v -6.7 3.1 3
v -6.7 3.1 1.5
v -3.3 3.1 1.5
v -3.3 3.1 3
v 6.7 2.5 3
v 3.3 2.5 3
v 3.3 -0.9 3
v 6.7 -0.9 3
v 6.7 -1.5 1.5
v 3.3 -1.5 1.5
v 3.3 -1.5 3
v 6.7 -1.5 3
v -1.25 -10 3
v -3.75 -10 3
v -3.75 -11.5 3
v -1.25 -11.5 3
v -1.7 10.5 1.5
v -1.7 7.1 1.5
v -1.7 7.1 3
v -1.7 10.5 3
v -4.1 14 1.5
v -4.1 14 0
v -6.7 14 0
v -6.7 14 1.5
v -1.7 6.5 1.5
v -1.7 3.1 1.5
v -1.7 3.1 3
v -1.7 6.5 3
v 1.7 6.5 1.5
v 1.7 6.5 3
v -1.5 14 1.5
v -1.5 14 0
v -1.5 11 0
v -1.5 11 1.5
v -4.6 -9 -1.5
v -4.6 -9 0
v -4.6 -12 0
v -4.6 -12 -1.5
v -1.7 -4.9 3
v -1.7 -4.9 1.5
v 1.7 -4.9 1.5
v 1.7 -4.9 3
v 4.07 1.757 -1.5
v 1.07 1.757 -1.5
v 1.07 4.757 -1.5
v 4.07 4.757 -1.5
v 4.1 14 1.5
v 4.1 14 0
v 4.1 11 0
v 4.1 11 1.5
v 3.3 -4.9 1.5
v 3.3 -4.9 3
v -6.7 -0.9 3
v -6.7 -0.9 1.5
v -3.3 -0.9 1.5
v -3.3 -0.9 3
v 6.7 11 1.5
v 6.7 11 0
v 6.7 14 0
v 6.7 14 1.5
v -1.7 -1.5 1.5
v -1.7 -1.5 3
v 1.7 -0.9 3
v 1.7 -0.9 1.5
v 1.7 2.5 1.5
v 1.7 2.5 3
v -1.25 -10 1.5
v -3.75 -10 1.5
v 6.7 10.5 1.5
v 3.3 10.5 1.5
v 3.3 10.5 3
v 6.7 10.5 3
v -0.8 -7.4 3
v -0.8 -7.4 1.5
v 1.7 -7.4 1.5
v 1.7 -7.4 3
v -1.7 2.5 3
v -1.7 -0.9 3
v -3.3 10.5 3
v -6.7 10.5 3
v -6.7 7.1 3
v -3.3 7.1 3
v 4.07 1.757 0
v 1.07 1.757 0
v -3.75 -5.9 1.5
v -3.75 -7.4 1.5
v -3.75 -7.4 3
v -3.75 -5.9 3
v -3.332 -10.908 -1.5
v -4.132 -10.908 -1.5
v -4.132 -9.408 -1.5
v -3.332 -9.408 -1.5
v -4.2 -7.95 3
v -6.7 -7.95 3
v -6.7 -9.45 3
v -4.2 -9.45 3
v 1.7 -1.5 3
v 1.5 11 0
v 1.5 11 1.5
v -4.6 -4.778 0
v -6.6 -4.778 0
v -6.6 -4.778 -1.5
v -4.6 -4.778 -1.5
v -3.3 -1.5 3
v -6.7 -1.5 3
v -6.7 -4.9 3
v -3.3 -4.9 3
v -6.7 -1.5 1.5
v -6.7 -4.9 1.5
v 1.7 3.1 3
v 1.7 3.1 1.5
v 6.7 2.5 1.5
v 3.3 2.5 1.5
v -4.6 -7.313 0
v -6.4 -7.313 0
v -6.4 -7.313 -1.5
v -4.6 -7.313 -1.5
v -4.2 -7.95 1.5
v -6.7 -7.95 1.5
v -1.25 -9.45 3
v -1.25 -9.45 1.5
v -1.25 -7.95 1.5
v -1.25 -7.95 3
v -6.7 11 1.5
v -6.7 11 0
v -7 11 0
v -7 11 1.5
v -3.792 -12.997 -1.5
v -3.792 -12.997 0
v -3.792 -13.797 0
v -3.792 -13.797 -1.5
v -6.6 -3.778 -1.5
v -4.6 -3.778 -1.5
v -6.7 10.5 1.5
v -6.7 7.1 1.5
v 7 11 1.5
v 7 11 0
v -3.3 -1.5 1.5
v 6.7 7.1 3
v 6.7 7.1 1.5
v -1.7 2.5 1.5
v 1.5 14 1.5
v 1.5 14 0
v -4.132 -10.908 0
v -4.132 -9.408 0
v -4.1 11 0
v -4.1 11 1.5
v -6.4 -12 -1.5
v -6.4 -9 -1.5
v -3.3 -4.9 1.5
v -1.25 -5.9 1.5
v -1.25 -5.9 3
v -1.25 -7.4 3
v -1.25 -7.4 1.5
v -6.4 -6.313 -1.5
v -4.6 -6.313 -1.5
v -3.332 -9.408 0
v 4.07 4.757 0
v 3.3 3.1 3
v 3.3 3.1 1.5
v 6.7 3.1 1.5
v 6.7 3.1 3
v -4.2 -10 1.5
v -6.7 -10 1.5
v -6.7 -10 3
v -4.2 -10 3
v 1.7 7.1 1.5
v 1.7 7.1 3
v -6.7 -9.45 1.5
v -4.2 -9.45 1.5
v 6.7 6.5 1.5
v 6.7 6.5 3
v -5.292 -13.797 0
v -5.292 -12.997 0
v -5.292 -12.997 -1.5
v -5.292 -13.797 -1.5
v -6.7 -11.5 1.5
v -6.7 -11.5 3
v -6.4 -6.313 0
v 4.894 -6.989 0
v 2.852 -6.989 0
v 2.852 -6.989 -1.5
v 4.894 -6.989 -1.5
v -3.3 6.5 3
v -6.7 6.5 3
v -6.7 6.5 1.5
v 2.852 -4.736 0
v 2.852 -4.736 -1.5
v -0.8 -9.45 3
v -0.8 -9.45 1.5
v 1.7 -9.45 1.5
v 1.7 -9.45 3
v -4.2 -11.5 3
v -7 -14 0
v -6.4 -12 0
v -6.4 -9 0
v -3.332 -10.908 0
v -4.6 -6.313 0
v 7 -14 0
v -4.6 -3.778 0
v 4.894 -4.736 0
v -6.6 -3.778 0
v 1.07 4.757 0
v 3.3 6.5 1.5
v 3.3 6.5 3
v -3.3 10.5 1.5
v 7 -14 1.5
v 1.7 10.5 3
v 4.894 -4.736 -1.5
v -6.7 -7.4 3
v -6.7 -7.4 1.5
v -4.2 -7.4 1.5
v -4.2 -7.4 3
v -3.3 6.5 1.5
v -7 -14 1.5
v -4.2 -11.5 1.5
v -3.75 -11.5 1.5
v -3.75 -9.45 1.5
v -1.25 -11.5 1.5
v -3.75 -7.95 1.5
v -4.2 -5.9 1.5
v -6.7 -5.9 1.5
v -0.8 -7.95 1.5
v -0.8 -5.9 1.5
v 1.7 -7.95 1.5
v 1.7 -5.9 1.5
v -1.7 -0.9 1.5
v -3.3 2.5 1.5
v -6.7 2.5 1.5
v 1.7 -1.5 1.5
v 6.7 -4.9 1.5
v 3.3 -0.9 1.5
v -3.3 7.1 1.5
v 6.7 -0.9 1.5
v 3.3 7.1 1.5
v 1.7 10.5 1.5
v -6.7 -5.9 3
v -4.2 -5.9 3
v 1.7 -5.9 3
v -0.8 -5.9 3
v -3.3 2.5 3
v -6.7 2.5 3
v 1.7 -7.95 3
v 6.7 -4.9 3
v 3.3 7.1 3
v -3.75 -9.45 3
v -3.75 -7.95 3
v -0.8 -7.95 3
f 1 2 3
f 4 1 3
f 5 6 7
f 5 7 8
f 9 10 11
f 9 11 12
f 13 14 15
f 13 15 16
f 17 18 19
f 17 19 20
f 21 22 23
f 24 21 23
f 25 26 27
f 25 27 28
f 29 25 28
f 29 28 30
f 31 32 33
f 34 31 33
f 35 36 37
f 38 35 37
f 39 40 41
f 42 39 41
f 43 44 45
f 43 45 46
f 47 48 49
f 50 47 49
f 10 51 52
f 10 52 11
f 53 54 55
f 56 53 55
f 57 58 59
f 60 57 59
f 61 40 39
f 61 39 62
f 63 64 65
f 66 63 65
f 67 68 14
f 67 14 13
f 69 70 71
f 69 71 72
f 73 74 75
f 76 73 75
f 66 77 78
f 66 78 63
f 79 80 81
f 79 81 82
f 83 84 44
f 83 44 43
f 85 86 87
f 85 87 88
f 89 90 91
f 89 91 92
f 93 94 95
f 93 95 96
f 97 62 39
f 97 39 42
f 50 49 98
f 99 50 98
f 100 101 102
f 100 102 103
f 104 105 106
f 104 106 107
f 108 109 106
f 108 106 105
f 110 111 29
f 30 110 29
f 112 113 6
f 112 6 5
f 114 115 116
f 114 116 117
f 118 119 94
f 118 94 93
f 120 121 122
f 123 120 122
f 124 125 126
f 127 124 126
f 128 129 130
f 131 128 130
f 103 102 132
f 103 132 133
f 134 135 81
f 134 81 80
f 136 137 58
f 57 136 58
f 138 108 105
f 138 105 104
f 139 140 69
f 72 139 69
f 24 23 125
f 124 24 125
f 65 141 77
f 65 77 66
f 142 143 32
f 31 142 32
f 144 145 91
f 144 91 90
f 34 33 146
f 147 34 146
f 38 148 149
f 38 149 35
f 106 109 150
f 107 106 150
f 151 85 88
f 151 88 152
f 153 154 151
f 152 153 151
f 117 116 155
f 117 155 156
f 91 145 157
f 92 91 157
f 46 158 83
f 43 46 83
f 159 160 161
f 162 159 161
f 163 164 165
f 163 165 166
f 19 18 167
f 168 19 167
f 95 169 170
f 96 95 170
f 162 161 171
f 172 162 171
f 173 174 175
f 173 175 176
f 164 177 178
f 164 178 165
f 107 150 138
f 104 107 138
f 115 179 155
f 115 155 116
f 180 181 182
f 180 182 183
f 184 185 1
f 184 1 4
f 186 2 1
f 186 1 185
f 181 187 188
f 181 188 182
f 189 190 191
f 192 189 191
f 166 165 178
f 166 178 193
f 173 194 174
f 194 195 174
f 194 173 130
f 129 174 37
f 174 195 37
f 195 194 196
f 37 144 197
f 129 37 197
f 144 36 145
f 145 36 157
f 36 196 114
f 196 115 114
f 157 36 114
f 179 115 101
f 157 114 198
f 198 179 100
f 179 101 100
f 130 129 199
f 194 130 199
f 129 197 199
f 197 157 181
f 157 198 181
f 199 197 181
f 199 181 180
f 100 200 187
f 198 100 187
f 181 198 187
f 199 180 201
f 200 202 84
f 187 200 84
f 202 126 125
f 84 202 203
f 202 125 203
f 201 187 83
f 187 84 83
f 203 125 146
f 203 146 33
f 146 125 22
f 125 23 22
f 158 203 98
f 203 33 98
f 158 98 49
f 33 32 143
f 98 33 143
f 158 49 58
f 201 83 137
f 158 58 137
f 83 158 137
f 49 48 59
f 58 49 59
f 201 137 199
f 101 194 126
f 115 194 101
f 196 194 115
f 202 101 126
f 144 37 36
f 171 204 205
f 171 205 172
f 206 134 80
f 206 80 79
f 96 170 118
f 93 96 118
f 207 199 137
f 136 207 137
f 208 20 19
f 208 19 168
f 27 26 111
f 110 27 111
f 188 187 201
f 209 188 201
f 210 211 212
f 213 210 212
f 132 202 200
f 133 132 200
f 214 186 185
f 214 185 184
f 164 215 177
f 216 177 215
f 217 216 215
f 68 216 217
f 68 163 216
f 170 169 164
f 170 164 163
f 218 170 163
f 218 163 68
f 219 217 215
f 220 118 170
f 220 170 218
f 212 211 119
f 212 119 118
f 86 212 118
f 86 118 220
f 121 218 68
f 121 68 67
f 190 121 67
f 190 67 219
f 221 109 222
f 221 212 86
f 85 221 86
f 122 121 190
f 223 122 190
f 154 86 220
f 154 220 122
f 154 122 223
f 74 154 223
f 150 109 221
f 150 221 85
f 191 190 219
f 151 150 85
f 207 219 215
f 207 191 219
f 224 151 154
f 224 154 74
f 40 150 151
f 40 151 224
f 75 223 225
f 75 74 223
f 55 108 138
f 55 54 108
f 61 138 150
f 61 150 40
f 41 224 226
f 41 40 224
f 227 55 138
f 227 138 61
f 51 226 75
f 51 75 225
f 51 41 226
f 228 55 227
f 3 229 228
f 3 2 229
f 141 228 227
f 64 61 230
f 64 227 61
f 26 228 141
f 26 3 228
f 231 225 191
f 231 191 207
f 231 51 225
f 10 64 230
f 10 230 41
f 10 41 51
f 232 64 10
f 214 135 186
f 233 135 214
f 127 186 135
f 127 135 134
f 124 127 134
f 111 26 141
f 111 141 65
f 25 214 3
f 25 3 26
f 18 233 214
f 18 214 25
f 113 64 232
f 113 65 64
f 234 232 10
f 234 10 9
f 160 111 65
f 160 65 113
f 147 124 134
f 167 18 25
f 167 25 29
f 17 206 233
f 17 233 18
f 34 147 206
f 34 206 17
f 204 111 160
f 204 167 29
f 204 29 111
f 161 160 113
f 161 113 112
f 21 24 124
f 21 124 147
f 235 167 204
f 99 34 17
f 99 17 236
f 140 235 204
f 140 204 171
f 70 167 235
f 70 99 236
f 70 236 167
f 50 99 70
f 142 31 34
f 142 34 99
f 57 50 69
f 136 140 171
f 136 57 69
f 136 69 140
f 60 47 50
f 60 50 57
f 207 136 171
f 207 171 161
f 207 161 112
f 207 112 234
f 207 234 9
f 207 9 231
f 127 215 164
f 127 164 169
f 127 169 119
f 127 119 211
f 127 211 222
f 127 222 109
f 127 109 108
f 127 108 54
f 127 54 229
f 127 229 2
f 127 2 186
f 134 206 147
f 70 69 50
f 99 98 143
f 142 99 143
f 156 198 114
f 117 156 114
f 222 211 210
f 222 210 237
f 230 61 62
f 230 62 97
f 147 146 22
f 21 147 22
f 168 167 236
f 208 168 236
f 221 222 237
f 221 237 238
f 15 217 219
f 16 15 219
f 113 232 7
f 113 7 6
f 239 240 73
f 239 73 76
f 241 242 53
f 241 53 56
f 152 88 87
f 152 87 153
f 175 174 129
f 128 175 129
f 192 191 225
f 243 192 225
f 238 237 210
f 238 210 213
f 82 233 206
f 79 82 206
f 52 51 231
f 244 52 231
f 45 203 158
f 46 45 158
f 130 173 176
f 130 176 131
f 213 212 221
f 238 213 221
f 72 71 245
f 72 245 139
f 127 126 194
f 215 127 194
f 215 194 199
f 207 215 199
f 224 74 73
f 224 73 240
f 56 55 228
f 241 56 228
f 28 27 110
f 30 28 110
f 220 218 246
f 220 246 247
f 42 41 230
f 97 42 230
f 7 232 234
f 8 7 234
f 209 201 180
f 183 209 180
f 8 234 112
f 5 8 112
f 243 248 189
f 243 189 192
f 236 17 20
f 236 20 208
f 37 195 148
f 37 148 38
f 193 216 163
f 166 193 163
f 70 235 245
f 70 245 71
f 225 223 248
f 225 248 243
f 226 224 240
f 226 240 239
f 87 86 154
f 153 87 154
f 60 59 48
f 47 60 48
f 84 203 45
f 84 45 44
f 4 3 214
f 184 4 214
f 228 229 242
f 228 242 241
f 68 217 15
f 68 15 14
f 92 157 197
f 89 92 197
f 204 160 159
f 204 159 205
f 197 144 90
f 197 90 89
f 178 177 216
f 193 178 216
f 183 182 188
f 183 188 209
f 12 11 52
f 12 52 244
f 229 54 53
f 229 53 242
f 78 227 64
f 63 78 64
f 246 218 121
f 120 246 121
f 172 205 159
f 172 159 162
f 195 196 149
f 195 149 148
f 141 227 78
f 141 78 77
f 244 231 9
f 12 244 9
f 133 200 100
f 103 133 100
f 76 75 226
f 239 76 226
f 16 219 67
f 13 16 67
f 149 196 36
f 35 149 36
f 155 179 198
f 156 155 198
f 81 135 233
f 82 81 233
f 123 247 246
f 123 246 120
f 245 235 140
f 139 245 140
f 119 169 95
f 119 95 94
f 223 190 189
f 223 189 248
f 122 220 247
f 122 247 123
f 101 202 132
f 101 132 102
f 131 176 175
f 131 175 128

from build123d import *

# Parameters (mm, degrees)
F1_DEPTH = 1.5
F3_W     = 3.4
F3_H     = 3.4
F3_W_2   = 2.5
F3_H_2   = 1.5
F4_DEPTH = 1.5
F5_W     = 3
F5_H     = 3
F5_W_2   = 2.042156
F5_H_2   = 2.253413
F5_W_3   = 1.8
F5_H_3   = 1
F5_W_4   = 2
F5_W_5   = 0.8
F5_H_4   = 1.5
F5_W_6   = 1.5
F5_H_5   = 0.8
F6_DEPTH = 1.5


with BuildPart() as f1:
    # F0 (on Top) → F1 (new body)
    with BuildSketch(Plane.XY):
        Polygon((-7, -14), (7, -14), (7, 11), (6.7, 11), (6.7, 14), (4.1, 14), (4.1, 11), (1.5, 11), (1.5, 14), (-1.5, 14), (-1.5, 11), (-4.1, 11), (-4.1, 14), (-6.7, 14), (-6.7, 11), (-7, 11), align=None)
    extrude(amount=F1_DEPTH)

    # F3 (on face) → F4 (join)
    with BuildSketch(Plane.XY.offset(1.5)):
        with Locations((-5, 8.8)):
            Rectangle(F3_W, F3_H)
        with Locations((-5, 4.8)):
            Rectangle(F3_W, F3_H)
        with Locations((-5, 0.8)):
            Rectangle(F3_W, F3_H)
        with Locations((-5, -3.2)):
            Rectangle(F3_W, F3_H)
        with Locations((0, 8.8)):
            Rectangle(F3_W, F3_H)
        with Locations((0, 4.8)):
            Rectangle(F3_W, F3_H)
        with Locations((0, 0.8)):
            Rectangle(F3_W, F3_H)
        with Locations((0, -3.2)):
            Rectangle(F3_W, F3_H)
        with Locations((5, 8.8)):
            Rectangle(F3_W, F3_H)
        with Locations((5, 4.8)):
            Rectangle(F3_W, F3_H)
        with Locations((5, 0.8)):
            Rectangle(F3_W, F3_H)
        with Locations((5, -3.2)):
            Rectangle(F3_W, F3_H)
        with Locations((-5.45, -6.65)):
            Rectangle(F3_W_2, F3_H_2)
        with Locations((-5.45, -8.7)):
            Rectangle(F3_W_2, F3_H_2)
        with Locations((-2.5, -6.65)):
            Rectangle(F3_W_2, F3_H_2)
        with Locations((-2.5, -8.7)):
            Rectangle(F3_W_2, F3_H_2)
        with Locations((0.45, -6.65)):
            Rectangle(F3_W_2, F3_H_2)
        with Locations((0.45, -8.7)):
            Rectangle(F3_W_2, F3_H_2)
        with Locations((-5.45, -10.75)):
            Rectangle(F3_W_2, F3_H_2)
        with Locations((-2.5, -10.75)):
            Rectangle(F3_W_2, F3_H_2)
    extrude(amount=F4_DEPTH)

    # F5 (on face) → F6 (join)
    with BuildSketch(Plane(origin=(0, 0, 0), x_dir=(1, 0, 0), z_dir=(0, 0, -1))):
        with Locations((2.570299, -3.256886)):
            Rectangle(F5_W, F5_H)
        with Locations((3.873054, 5.862395)):
            Rectangle(F5_W_2, F5_H_2)
        with Locations((-5.5, 10.5)):
            Rectangle(F5_W_3, F5_H)
        with Locations((-5.5, 6.813054)):
            Rectangle(F5_W_3, F5_H_3)
        with Locations((-5.6, 4.277964)):
            Rectangle(F5_W_4, F5_H_3)
        with Locations((-3.732216, 10.157964)):
            Rectangle(F5_W_5, F5_H_4)
        with Locations((-4.542036, 13.397247)):
            Rectangle(F5_W_6, F5_H_5)
    extrude(amount=F6_DEPTH)


solid = f1.part
